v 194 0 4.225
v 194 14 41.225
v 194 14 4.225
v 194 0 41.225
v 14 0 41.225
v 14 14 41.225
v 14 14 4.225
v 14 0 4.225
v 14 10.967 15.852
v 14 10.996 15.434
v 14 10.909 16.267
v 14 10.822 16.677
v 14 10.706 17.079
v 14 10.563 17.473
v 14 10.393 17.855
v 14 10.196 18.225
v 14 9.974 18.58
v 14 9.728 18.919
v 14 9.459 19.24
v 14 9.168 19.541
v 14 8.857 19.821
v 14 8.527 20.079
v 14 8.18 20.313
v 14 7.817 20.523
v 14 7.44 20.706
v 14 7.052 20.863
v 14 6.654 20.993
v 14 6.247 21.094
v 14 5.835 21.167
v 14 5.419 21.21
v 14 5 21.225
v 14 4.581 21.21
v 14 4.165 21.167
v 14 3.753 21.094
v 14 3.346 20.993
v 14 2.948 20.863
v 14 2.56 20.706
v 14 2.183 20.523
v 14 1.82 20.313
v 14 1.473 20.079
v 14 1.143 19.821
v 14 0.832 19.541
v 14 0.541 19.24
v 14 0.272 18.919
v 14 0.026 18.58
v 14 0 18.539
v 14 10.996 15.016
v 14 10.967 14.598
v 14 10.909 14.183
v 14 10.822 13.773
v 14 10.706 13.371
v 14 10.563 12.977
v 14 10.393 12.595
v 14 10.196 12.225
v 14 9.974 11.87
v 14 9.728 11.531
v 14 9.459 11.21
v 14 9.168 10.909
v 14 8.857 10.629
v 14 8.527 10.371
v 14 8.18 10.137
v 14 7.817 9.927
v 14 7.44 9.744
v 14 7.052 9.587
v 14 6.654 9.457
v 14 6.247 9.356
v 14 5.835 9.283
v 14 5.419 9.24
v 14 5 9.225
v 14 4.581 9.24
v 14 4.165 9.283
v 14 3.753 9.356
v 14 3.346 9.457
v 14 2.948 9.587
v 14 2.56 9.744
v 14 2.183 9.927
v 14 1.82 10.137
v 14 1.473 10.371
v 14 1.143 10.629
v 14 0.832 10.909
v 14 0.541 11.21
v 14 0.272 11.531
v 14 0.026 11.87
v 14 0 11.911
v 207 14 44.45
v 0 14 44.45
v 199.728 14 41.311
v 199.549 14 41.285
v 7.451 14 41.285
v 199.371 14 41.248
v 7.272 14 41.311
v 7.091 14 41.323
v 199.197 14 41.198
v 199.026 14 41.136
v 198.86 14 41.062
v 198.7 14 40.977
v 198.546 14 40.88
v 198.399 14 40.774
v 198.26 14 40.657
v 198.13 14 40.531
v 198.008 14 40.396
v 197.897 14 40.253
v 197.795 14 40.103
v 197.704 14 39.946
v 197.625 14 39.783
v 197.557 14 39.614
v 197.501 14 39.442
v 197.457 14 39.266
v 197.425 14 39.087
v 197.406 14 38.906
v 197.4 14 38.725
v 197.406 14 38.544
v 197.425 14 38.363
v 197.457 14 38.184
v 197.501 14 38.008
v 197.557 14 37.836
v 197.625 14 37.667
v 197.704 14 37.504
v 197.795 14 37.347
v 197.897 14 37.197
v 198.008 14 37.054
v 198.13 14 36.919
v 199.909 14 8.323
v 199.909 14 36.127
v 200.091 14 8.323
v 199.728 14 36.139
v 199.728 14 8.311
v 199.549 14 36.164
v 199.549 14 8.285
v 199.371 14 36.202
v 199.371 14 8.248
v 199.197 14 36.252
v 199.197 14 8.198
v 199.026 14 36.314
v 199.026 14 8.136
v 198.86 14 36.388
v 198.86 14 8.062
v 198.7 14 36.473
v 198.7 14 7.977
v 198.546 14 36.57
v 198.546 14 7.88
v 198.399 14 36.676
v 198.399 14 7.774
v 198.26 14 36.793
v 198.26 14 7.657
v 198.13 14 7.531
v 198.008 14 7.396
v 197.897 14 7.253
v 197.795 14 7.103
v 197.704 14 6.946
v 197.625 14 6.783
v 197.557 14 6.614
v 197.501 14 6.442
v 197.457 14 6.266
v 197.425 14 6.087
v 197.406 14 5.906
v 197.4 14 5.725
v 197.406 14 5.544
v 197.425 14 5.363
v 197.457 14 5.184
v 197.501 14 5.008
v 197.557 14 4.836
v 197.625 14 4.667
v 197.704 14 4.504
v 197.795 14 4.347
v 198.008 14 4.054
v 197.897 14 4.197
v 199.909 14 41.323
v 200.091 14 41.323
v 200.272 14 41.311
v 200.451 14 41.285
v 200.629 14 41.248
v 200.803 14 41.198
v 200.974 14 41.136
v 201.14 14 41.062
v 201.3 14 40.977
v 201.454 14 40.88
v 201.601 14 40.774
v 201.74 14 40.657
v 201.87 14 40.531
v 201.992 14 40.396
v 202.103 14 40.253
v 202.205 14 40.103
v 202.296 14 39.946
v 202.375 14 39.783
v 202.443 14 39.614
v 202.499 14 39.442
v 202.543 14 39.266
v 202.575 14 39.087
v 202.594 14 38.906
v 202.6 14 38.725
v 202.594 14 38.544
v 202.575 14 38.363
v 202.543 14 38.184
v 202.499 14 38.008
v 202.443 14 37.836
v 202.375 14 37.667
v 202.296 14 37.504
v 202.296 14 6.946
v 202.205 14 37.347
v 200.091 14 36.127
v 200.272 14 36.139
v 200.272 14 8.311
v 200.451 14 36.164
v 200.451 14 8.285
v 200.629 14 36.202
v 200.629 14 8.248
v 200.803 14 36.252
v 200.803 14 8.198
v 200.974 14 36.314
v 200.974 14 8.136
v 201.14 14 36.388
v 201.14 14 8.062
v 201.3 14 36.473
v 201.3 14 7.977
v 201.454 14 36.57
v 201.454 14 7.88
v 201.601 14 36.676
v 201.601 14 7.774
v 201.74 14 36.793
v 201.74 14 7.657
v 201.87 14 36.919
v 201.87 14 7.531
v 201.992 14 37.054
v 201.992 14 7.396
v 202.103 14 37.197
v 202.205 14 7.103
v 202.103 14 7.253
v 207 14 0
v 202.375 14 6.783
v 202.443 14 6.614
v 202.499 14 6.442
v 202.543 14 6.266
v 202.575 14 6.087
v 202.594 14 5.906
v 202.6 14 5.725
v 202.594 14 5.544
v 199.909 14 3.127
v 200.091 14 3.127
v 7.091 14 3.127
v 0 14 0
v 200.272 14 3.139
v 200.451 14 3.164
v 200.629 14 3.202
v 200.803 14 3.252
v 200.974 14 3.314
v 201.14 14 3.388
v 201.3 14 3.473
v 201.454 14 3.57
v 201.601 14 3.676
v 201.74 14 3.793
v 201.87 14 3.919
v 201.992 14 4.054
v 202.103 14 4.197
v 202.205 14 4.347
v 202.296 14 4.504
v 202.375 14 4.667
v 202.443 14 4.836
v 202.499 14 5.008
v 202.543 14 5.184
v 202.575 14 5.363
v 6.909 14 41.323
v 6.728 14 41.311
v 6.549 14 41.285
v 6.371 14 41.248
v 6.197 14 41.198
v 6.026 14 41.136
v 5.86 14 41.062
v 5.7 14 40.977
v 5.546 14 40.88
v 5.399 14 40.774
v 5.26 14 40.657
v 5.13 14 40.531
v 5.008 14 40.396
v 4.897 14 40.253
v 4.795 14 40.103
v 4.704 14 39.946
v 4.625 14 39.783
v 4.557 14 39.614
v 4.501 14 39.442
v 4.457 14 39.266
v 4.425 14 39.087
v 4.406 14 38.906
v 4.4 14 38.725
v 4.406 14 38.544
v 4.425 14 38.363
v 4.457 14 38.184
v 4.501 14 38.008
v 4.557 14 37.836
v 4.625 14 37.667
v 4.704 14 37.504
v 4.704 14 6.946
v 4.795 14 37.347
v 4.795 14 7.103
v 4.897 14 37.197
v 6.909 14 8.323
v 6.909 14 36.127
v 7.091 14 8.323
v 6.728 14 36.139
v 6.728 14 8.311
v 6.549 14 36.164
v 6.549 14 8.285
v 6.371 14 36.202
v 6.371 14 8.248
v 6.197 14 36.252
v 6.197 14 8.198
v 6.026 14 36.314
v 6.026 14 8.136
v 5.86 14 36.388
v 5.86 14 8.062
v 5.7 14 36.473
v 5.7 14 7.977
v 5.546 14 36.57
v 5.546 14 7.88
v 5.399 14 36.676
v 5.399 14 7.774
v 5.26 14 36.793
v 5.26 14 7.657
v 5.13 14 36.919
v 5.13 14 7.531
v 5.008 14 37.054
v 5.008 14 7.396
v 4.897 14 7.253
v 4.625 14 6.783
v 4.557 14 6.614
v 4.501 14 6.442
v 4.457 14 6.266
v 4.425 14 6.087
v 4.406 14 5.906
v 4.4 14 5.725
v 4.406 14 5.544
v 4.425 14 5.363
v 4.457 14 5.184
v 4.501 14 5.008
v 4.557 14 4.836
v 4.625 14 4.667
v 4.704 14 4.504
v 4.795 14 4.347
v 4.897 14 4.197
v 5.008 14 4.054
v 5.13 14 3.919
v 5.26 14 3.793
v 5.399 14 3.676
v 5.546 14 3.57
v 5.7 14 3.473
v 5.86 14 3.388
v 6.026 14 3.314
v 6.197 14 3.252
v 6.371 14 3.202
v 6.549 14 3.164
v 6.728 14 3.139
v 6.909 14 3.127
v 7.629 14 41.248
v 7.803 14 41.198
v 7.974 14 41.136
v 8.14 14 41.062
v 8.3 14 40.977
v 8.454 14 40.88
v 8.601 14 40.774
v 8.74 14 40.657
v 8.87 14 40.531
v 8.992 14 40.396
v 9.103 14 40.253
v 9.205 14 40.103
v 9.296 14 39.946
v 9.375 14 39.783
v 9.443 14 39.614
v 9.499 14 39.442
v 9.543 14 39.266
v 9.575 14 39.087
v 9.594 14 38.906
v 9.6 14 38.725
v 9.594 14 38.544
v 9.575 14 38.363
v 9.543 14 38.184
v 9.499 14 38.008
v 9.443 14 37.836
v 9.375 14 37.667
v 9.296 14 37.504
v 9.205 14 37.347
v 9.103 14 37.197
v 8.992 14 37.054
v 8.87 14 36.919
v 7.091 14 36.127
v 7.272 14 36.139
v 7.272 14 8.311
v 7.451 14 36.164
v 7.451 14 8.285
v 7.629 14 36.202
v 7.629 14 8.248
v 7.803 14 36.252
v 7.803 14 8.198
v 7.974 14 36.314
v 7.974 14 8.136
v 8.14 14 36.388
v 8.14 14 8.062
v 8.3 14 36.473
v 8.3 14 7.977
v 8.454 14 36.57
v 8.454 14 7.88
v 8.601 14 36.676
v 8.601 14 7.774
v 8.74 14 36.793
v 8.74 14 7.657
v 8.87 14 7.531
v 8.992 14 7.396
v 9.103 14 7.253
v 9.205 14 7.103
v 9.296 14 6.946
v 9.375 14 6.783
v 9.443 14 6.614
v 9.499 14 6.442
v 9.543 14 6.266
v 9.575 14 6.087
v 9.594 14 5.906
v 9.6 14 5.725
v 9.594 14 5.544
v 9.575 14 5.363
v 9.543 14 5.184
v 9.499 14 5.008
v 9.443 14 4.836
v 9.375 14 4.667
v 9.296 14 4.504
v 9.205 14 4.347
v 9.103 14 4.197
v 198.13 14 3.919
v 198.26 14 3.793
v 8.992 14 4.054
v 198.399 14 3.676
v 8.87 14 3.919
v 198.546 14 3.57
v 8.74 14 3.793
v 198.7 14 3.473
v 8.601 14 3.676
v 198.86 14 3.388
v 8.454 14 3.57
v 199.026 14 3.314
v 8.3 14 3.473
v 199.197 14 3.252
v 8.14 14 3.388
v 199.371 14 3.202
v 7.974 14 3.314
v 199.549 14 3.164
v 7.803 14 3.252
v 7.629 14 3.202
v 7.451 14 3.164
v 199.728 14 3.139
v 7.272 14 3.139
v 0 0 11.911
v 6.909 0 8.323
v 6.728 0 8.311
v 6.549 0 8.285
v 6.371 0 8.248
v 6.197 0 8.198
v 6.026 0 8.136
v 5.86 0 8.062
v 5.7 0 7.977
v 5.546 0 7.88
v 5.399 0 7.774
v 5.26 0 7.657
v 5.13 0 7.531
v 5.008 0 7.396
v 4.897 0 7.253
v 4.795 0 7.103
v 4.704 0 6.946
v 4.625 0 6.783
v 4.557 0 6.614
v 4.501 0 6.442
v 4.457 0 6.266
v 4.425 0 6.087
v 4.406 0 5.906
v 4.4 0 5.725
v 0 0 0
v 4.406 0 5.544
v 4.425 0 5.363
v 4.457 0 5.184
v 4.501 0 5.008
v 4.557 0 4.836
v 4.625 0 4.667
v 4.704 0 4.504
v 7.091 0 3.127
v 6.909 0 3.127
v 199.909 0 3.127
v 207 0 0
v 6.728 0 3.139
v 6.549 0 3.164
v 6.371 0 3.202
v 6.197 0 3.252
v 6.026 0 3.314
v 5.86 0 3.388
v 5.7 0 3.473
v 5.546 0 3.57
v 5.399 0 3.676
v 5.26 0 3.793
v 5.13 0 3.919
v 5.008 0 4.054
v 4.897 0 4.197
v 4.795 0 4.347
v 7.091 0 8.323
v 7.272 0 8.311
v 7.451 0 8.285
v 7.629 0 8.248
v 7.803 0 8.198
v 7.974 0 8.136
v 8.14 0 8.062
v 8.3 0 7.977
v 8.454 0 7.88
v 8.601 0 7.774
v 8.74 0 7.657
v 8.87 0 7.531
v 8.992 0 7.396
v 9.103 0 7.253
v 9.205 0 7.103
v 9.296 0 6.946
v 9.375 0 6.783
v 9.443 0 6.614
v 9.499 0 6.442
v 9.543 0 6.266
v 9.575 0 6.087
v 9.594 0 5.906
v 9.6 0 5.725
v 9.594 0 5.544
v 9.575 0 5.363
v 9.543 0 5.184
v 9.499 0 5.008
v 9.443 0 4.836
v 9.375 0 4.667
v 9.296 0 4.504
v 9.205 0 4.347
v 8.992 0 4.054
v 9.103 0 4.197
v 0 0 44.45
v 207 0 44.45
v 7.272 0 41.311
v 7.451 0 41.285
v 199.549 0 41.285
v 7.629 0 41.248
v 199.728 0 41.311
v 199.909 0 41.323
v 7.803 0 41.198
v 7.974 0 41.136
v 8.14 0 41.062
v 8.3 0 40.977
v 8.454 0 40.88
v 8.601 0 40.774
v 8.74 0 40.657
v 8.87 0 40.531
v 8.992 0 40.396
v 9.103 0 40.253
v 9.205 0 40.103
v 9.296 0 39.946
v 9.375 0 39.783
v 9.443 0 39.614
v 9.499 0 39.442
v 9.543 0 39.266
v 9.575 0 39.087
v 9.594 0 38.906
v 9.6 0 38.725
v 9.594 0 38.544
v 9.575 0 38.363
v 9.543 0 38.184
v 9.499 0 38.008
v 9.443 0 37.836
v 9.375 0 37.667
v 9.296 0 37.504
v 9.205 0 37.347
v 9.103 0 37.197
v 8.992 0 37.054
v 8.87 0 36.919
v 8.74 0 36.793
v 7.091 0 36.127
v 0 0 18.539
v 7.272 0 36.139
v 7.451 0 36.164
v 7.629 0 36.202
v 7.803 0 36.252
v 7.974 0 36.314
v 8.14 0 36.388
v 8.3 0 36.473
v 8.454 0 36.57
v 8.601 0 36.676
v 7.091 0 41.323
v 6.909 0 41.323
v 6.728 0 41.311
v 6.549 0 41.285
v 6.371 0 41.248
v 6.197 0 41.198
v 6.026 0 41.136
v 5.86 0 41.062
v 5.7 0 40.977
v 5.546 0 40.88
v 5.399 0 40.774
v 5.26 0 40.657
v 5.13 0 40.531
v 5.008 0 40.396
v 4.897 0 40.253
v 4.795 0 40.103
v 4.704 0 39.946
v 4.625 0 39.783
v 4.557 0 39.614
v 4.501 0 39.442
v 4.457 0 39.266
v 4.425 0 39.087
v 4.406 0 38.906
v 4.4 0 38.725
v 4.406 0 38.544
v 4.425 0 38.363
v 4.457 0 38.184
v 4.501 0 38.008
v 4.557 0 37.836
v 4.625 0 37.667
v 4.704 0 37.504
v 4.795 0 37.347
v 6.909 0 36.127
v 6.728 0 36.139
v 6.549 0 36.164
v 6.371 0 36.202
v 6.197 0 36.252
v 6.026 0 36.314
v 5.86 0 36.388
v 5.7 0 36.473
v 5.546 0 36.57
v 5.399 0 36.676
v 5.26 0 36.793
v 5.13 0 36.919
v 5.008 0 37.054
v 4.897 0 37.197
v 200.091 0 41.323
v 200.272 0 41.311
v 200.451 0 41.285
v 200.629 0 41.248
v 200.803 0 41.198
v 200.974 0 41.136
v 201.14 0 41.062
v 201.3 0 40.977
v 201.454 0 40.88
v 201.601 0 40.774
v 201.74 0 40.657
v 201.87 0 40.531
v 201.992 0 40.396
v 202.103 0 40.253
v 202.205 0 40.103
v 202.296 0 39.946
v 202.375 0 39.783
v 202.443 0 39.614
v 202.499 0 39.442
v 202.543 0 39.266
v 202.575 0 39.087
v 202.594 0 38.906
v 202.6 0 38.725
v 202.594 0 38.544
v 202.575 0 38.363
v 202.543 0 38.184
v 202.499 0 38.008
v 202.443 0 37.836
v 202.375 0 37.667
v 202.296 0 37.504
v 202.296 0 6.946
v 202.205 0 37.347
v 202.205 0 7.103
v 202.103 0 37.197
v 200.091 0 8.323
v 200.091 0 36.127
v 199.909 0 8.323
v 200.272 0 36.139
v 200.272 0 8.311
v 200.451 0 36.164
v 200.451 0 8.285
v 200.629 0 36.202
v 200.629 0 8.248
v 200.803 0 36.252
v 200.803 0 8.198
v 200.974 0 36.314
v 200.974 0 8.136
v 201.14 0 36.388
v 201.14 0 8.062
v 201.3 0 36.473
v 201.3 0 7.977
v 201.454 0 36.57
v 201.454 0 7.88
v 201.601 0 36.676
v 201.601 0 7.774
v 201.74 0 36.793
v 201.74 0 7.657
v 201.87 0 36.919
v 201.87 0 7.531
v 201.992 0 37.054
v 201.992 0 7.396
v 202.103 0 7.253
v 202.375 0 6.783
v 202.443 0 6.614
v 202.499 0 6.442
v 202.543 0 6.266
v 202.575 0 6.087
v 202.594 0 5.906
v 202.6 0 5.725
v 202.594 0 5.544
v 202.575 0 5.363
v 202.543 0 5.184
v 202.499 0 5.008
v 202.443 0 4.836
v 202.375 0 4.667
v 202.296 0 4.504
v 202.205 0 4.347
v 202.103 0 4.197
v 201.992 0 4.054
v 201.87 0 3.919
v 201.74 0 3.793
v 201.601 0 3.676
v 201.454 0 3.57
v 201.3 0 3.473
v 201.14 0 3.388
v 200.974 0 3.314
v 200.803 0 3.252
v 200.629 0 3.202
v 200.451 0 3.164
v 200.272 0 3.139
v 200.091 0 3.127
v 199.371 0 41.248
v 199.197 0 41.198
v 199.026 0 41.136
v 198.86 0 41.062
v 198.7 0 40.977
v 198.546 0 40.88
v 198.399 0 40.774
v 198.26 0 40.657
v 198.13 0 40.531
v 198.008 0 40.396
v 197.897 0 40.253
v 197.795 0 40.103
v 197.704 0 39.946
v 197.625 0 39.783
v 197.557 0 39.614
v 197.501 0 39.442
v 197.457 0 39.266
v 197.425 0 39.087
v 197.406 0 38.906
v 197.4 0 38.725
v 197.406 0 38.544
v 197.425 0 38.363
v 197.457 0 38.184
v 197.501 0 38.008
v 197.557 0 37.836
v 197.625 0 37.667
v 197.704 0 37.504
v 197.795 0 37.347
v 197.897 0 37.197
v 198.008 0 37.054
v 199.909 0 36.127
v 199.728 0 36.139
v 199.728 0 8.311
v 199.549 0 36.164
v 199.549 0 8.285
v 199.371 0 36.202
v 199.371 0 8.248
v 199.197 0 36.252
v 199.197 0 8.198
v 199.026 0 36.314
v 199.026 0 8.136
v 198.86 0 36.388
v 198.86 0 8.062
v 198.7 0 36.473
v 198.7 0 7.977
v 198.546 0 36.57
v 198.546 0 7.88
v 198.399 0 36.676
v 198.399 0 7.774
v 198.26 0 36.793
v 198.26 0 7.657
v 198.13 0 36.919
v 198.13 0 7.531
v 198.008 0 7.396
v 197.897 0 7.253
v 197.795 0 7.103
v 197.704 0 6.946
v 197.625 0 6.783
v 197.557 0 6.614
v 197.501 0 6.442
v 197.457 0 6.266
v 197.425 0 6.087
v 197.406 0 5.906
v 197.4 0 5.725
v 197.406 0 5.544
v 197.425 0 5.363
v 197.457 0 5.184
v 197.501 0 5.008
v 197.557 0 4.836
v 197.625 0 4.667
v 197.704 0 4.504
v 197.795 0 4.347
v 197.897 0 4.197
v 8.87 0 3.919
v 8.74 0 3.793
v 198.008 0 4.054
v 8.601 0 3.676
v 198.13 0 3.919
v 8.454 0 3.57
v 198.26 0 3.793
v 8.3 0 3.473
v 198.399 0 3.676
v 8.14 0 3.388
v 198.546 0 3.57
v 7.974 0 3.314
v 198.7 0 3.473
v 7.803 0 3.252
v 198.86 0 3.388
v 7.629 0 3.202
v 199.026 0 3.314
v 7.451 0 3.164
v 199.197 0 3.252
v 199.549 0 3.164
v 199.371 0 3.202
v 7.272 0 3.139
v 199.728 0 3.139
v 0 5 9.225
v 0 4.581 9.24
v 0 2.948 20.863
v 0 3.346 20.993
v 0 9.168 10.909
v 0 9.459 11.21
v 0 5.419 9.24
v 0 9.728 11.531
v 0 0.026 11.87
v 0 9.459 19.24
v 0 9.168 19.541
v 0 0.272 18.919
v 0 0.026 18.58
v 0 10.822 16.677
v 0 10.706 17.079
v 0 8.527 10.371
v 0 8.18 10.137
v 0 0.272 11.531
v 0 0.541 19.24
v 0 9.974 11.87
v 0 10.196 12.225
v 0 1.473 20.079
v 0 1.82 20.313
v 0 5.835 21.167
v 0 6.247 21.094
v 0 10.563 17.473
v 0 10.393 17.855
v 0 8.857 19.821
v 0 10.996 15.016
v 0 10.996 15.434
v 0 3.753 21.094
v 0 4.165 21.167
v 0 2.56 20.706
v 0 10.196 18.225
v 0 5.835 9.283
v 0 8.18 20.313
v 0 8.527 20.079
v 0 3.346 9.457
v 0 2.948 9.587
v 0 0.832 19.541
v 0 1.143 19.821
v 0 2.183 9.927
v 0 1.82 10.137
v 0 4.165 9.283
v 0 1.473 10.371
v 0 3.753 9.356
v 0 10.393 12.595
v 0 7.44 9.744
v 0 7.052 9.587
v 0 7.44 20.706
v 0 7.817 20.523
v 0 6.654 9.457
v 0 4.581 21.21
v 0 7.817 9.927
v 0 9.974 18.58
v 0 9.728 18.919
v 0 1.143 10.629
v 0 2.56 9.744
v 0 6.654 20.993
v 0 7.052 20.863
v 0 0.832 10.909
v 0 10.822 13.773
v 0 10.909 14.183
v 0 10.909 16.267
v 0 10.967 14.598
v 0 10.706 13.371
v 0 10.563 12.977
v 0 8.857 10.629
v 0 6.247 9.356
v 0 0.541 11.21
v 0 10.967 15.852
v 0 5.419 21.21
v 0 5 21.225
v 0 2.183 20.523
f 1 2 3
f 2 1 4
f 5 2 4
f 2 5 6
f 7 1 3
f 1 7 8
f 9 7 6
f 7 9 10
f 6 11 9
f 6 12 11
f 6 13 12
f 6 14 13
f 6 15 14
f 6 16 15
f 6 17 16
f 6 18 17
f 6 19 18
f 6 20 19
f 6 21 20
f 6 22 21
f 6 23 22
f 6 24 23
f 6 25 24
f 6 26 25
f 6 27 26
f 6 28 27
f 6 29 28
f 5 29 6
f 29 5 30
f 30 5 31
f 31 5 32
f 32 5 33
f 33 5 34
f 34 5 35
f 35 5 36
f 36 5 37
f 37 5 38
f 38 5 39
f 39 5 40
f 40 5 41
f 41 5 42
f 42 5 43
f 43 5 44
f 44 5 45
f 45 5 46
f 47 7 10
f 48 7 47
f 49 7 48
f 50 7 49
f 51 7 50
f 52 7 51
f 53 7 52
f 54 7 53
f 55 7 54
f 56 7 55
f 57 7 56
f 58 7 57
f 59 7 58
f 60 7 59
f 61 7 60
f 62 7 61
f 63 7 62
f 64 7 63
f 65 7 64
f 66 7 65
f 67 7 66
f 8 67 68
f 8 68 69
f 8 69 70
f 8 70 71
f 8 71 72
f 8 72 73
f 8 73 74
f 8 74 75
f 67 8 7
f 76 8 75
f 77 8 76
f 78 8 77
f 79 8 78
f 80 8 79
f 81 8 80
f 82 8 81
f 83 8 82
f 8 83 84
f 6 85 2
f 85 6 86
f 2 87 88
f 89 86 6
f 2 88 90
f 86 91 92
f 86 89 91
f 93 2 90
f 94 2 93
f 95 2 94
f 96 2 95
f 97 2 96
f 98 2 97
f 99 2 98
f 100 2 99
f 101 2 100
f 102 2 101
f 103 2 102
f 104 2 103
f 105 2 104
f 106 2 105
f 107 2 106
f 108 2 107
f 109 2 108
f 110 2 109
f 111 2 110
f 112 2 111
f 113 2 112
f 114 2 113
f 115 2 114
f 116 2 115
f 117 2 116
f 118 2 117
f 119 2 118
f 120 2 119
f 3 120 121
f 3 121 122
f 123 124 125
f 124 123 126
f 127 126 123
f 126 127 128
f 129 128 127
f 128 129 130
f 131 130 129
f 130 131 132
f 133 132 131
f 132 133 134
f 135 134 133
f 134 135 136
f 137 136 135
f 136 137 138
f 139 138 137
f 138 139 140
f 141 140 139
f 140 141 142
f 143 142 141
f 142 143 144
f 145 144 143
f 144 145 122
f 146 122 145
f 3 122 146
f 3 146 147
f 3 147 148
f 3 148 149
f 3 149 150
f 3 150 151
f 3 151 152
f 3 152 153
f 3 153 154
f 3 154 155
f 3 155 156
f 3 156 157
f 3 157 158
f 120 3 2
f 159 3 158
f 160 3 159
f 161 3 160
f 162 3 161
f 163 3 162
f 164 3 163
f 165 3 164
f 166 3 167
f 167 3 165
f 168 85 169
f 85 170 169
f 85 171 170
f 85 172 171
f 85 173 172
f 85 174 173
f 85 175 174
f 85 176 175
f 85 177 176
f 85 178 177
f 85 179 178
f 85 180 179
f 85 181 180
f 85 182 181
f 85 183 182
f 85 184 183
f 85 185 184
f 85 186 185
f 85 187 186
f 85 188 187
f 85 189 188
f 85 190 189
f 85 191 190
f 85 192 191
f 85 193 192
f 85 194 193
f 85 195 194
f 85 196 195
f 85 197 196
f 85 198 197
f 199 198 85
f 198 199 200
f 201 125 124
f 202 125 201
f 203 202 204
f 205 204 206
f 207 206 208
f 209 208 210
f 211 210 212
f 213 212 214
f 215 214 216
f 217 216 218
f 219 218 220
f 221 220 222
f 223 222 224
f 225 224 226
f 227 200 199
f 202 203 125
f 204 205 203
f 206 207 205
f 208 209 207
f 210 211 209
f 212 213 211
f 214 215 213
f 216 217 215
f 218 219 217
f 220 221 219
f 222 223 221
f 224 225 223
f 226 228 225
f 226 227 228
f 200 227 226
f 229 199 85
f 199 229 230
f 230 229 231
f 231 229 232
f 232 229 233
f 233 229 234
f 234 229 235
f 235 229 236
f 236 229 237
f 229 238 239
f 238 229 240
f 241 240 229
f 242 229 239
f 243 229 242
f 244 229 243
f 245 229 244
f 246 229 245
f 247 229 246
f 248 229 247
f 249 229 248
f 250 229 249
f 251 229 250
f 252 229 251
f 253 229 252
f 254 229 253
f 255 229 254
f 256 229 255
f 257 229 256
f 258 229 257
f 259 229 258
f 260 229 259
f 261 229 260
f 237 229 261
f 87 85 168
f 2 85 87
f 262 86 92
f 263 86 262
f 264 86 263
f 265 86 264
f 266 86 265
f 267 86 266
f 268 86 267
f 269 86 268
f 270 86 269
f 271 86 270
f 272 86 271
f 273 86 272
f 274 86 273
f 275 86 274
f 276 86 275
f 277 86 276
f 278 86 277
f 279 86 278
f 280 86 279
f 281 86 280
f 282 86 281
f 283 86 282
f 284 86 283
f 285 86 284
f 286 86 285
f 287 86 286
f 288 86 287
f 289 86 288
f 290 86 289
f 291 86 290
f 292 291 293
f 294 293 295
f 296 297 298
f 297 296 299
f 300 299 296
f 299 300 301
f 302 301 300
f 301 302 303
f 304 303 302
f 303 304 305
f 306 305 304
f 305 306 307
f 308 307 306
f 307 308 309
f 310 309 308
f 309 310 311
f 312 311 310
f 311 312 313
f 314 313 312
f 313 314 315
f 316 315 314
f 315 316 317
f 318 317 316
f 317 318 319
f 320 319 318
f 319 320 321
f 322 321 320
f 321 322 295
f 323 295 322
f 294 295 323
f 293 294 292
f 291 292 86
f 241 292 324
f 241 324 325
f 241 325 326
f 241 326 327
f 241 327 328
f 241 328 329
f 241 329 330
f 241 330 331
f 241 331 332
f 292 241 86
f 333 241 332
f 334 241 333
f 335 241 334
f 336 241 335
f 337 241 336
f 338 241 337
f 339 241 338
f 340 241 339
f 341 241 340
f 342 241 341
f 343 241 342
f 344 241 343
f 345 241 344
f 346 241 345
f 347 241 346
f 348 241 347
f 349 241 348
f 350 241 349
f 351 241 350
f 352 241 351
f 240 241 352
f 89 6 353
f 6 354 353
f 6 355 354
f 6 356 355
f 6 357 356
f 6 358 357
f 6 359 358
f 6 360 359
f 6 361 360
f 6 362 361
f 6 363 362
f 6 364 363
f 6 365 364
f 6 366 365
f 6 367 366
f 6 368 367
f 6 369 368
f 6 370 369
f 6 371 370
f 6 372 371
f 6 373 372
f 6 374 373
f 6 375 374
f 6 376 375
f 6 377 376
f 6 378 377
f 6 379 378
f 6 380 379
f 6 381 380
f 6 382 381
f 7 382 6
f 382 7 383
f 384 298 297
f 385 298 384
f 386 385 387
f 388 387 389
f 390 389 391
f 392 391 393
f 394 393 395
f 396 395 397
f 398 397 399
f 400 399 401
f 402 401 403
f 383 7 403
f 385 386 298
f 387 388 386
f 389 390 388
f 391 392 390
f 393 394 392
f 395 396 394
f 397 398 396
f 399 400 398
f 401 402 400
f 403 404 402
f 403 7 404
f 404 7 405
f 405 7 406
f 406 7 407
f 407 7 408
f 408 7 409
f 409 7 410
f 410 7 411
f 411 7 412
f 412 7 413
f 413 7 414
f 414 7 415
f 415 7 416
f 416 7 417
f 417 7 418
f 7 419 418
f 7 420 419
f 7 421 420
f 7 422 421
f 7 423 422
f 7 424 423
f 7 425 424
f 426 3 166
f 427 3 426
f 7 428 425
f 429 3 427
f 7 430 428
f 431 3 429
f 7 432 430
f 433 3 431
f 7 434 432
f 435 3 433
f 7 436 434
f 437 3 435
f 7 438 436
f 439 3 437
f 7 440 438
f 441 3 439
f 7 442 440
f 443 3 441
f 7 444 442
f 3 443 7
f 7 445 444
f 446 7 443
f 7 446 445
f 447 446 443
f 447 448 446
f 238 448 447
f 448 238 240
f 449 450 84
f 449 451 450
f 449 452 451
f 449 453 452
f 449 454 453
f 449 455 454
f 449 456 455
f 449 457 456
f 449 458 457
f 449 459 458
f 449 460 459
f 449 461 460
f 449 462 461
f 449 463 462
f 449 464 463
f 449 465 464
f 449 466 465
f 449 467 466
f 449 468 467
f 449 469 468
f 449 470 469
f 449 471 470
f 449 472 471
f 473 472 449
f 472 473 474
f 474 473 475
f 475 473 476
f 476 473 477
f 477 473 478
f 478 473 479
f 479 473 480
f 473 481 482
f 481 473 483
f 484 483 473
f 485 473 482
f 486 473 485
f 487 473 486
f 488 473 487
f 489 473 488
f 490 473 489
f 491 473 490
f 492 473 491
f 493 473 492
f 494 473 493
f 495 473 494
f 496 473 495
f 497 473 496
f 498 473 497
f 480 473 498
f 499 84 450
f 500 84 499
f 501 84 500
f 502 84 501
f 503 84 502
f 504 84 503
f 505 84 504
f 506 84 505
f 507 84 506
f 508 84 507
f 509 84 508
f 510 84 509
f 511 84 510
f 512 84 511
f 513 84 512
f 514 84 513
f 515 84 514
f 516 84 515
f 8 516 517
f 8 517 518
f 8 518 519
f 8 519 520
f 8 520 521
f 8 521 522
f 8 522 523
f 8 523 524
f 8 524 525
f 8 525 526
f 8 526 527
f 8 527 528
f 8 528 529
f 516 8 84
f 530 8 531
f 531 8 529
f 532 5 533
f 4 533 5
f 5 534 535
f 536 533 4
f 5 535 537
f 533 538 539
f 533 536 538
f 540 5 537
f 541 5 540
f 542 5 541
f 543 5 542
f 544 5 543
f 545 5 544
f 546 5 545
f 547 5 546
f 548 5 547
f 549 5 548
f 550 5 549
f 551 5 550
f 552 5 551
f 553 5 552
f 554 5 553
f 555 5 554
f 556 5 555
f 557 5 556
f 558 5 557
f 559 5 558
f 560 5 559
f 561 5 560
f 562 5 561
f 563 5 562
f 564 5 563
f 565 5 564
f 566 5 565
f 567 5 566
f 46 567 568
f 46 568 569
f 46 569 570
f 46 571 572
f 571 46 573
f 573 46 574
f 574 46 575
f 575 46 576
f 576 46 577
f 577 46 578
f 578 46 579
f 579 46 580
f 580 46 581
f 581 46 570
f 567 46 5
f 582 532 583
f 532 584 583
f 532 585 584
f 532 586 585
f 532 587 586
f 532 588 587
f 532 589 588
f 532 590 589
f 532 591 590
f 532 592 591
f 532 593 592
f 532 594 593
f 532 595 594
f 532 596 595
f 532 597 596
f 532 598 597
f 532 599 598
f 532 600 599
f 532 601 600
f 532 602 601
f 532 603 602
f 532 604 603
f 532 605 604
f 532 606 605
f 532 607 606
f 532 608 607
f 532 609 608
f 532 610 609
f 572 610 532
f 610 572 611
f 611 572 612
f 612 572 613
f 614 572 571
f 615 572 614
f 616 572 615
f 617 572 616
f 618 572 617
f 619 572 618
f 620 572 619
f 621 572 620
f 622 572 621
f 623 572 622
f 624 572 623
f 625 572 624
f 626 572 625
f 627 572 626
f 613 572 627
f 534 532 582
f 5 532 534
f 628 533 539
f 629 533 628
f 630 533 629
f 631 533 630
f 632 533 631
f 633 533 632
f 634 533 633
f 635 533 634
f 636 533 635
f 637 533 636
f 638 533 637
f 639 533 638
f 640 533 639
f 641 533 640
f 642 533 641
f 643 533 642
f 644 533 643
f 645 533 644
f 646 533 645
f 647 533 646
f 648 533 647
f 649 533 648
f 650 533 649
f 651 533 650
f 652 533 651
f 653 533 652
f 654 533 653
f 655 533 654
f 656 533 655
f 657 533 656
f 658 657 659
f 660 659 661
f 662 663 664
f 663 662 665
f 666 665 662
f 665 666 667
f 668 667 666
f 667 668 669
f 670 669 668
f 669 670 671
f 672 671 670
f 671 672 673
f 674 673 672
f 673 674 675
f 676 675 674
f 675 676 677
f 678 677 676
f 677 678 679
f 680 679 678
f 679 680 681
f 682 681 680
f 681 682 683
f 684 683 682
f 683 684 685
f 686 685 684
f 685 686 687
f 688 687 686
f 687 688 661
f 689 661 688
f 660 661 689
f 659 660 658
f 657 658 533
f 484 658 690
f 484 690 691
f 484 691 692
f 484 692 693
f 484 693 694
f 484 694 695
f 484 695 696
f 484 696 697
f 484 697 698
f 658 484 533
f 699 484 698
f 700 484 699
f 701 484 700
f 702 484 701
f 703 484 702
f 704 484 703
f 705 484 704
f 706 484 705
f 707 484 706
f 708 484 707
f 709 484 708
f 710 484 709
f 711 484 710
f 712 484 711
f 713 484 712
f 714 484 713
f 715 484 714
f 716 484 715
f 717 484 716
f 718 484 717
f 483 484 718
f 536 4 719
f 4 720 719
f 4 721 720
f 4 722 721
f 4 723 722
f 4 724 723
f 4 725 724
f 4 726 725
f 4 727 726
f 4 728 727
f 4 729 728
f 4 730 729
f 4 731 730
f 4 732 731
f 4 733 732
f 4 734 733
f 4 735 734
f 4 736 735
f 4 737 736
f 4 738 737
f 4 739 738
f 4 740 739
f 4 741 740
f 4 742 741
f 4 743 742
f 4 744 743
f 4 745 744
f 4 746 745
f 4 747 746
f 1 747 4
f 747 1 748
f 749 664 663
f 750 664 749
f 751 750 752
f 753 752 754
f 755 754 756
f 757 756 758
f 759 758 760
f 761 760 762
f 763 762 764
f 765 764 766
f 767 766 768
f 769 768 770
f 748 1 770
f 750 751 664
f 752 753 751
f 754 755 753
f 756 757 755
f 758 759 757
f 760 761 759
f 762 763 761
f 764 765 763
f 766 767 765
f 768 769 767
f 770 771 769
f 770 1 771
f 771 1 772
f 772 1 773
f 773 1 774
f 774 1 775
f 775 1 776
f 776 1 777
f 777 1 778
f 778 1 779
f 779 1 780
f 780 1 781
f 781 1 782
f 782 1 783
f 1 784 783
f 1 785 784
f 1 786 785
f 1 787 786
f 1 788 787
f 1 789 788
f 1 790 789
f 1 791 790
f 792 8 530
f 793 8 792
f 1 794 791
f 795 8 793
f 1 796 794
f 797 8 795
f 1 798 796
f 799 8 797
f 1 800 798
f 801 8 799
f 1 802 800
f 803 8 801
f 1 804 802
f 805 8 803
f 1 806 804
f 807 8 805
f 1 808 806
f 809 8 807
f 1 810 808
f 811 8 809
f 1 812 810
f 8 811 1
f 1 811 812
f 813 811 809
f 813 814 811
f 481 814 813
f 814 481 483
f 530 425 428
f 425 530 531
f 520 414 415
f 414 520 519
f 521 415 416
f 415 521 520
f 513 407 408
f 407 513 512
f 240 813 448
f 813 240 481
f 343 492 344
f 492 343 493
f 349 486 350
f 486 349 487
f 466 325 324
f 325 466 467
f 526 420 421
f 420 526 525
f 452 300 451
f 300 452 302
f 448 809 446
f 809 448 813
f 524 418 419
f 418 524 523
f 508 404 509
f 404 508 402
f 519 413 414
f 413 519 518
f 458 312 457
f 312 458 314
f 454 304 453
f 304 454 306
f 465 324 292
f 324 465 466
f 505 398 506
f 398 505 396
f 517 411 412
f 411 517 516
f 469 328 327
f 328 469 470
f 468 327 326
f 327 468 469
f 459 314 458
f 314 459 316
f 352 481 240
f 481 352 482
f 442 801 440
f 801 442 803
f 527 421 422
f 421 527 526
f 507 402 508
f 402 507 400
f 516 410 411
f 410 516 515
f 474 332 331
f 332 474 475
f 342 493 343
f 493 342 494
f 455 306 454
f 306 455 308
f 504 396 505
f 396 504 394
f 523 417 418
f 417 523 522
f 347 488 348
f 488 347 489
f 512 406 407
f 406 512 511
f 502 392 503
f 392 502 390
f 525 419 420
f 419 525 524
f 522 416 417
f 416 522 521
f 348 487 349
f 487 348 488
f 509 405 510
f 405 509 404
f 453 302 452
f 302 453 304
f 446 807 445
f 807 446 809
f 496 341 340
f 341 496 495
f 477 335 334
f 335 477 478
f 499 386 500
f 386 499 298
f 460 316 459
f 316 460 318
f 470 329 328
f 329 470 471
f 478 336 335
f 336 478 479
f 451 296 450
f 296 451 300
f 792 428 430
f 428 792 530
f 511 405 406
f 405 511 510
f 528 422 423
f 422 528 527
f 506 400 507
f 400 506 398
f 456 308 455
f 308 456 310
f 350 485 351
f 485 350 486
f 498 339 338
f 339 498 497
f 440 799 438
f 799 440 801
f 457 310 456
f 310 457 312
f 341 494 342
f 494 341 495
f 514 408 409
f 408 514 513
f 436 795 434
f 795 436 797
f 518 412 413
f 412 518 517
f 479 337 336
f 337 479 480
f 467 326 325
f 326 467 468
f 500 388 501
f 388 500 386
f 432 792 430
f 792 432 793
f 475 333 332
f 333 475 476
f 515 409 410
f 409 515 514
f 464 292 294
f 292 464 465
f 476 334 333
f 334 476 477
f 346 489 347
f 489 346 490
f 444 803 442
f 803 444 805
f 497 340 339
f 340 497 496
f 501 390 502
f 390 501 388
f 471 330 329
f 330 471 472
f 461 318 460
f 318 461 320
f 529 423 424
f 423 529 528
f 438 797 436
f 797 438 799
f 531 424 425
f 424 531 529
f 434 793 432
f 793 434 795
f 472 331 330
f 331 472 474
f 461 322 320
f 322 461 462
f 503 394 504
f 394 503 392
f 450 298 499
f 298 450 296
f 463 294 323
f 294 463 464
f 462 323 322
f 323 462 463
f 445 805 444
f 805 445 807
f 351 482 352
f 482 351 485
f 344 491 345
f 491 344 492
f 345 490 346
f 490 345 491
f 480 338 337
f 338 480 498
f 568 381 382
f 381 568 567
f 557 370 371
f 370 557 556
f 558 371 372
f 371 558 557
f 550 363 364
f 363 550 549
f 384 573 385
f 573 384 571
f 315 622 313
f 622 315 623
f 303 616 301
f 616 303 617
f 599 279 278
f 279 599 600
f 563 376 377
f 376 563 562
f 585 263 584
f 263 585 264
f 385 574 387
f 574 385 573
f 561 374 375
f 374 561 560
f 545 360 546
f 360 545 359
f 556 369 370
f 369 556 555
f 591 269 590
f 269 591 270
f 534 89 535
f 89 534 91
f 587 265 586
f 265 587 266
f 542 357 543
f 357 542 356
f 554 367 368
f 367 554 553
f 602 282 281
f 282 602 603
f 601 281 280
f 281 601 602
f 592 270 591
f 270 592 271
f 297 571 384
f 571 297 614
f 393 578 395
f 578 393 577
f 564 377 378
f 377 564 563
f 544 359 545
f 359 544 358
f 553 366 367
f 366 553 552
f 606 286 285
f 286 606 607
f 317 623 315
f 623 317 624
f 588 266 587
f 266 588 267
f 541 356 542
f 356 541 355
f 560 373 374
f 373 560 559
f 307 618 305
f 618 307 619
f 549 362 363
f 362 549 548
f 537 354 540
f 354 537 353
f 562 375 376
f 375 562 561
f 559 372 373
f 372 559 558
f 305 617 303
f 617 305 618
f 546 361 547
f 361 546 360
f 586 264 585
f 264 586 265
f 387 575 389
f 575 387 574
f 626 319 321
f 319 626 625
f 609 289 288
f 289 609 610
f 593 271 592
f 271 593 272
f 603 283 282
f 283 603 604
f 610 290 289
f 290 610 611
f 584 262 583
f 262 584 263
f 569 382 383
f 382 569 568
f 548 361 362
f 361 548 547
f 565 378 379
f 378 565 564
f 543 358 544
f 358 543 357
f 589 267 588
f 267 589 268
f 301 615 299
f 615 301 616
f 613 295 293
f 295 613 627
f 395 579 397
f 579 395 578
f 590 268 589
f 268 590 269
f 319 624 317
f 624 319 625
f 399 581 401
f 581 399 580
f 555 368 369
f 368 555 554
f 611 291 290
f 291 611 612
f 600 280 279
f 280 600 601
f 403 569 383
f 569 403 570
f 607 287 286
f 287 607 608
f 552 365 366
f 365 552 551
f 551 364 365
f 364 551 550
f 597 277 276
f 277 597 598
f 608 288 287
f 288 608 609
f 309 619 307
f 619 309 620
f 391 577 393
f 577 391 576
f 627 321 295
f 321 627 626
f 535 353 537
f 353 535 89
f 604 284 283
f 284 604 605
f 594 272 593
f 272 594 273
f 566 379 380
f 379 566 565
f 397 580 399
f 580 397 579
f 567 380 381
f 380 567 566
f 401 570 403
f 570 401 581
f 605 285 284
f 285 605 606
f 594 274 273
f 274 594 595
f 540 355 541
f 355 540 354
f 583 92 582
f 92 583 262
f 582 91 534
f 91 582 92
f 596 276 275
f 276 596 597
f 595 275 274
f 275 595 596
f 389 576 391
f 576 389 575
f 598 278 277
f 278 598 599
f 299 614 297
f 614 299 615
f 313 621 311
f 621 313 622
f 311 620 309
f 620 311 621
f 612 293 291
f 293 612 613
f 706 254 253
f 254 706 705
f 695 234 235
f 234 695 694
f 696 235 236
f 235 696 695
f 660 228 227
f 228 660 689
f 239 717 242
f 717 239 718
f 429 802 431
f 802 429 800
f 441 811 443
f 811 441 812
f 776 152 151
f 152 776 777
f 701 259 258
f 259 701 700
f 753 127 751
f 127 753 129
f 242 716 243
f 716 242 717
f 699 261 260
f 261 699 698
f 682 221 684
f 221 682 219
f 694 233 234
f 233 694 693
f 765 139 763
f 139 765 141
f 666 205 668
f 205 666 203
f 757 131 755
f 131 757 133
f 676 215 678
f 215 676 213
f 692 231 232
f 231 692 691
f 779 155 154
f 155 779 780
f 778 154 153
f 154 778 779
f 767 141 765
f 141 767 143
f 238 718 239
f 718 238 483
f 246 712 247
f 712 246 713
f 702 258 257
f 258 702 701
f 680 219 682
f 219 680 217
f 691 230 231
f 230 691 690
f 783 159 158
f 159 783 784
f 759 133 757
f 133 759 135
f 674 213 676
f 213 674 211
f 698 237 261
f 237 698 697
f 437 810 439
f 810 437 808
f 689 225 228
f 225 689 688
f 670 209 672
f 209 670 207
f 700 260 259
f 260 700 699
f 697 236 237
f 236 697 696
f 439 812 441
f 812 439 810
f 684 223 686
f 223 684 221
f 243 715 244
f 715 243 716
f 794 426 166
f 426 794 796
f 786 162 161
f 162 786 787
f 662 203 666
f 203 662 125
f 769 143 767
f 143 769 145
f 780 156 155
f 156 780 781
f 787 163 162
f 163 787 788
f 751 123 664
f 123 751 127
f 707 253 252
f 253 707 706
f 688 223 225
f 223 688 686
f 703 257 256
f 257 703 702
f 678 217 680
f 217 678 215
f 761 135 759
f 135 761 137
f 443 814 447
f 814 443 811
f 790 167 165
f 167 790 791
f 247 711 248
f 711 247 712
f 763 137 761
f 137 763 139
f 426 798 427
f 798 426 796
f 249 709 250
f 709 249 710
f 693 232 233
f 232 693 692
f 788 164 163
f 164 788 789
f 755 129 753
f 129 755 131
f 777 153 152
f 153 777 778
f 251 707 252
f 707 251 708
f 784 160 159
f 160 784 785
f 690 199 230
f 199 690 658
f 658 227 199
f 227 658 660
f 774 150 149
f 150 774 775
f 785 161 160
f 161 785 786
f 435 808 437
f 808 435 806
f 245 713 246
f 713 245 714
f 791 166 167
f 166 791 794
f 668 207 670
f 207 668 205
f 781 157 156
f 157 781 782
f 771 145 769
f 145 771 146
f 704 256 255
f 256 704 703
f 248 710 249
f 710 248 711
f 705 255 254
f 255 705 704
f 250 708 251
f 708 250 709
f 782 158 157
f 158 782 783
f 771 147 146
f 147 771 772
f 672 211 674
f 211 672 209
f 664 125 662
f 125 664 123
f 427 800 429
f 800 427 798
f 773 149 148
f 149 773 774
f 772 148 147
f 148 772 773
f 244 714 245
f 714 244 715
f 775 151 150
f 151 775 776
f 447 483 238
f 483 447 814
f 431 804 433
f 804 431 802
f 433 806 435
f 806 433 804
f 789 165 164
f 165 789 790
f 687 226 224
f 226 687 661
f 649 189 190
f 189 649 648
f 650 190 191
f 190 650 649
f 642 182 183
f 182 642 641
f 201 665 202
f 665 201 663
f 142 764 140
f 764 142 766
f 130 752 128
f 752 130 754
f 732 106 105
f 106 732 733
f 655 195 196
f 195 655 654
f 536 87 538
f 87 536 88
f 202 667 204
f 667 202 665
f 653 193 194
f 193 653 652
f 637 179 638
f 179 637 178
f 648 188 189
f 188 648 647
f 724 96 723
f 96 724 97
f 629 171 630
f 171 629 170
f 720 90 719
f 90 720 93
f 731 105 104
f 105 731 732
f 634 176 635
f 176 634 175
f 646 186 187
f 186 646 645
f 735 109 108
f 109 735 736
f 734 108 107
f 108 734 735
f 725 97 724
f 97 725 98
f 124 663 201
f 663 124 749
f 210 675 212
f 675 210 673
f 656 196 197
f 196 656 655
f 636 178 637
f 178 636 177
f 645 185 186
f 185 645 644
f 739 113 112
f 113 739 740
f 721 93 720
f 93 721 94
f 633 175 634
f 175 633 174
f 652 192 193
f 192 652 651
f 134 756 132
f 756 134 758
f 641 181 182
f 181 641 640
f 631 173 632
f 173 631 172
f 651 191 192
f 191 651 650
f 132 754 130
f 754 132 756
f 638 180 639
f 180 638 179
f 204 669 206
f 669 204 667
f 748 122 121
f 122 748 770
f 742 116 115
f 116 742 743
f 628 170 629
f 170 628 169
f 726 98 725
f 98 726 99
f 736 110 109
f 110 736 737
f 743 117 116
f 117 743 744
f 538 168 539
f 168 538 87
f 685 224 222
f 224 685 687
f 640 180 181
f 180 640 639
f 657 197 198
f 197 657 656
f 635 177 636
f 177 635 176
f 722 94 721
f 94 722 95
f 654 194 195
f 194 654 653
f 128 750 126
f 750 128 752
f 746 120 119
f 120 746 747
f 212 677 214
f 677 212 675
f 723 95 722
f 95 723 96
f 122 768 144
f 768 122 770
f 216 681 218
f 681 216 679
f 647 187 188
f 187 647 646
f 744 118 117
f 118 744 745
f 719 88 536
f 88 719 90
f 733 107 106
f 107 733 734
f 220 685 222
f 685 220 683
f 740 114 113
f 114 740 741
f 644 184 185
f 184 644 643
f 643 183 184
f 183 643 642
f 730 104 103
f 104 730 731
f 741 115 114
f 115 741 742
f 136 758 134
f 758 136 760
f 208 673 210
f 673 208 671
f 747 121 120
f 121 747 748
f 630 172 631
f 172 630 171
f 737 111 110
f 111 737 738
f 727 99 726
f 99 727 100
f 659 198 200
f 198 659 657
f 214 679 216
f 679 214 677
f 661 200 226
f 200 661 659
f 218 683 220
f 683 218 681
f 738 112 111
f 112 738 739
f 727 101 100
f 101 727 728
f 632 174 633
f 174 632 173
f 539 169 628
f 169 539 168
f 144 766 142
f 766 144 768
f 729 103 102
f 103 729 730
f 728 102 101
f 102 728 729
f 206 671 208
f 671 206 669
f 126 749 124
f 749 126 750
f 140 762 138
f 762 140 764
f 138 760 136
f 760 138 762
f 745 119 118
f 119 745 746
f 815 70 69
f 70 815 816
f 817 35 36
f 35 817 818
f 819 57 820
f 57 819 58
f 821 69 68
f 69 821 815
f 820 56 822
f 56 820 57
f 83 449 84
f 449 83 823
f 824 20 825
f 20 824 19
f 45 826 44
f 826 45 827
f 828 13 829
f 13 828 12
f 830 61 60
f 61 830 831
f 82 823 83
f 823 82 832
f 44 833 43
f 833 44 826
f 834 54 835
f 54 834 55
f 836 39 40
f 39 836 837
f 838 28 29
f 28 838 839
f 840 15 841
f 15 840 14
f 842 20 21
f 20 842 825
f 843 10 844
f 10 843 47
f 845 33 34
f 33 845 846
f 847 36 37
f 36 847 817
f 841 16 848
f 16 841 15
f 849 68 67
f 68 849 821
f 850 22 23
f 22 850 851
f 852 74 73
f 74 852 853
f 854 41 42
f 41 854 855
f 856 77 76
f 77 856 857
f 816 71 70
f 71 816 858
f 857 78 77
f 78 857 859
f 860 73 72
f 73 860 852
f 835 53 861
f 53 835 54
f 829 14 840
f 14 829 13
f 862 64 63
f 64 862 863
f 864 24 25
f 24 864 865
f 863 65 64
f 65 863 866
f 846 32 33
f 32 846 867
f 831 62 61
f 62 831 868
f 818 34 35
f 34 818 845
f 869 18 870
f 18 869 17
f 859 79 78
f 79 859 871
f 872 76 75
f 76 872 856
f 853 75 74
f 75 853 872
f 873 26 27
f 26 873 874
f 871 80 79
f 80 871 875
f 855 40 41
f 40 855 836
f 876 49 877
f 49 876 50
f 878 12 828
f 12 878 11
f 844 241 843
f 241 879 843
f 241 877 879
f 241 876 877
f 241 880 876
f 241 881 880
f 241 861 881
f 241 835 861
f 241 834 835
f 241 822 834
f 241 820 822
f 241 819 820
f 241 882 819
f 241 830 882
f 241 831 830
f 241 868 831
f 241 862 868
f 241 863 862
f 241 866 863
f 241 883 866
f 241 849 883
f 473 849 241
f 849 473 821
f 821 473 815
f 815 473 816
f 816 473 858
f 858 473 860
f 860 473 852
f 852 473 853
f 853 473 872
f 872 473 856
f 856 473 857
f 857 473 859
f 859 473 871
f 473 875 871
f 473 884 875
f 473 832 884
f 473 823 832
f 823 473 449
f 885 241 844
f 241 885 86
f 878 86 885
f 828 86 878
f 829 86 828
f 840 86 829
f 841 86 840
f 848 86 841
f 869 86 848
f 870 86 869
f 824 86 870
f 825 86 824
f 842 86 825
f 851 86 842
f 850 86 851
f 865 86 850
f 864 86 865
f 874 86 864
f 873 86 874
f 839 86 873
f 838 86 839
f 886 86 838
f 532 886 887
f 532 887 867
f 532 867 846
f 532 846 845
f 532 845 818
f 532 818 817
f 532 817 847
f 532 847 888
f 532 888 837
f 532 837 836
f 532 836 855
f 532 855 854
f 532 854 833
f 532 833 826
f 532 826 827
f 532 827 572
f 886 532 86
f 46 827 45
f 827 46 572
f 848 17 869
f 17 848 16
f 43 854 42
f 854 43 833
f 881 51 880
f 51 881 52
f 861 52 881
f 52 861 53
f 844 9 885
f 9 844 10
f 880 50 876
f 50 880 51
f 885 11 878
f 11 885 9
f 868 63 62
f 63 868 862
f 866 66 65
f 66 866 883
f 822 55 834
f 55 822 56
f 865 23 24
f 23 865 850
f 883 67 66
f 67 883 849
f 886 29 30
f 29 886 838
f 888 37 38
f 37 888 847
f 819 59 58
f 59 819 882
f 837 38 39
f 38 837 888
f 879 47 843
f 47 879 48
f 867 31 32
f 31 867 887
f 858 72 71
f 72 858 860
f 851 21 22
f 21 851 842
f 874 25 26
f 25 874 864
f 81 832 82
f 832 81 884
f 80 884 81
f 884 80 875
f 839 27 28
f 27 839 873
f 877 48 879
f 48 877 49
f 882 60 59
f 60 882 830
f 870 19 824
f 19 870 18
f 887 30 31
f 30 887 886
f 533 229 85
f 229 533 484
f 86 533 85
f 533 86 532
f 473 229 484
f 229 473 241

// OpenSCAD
// file: ../../utils/constants.scad
$fn=90;  // accuracy

/* Server dimentions */

// one server unit
u1 = 44.45;  

// two server unit
u2 = u1*2;   

// total width
// The total with of the a server rack (19")
// this includes the mounting holes
tw  = 482.6; 

// Total inner width
// The distance between the mounting holes in the server rack
tiw = 450; // TODO: 432?  


/* Rack hole dimentions */

// width distance rack holes
wdrh = 465;

// height distance rack holes
hdrh = 33;


/* dell optiplex 7040 micro usff dimentions */

// dell optiplex 7040 height
do7040h = 36;

// dell optiplex 7040 width
do7040w = 182;

// dell optiplex 7040 depth
do7040d = 179;

// dell optiplex 7040 rubber feet width distance
do7040rfwd = 14.9;

// dell optiplex 7040 rubber feet back depth distance
do7040rfbdd = 9.9;


/* Case dimentions */

// case height outer 
// A small margin is included to so that the case does not 
// exide two server units
cho = u2-0.2; 

// case height inner
// The thickness of the walls can then be calculated as (cho-chi)/2
chi = cho-7*2;

// case width outer
// as there are three parts of the rack server case we just devide
// the total inner width with three 
cwo = tiw/3;

// case width inner
// 132 was calculated by defining by the desired with between each node, 
// i.e., 22. The first and last hole is 22/2 mm away from the side of the case.
// This gives us 22*5+(22/2)*2 = 22*6 = 132
cwi = 132;

// case depth thickness
// How thick the case should be. It should not be that important.
// Just know that it is enough for a screw to thread in the case 
cdt = 14;

// case inner side thickness
// The middle and the side case over lap so that a screw can be entered
// between the two cases. The cist is defined as the thickness of the part
// that does not overlap between the midle and side case.
cist = 3.5;

// nodes per case
npc = 6;
// main file
include <../../utils/constants.scad>;

/* caseSideMount
    height: should be the same as usff-pc height
    ct: case thickness
    power_switch: ture/false
*/
module usffSide(ew, height, ct, power_switch) {
  m = 1; // margin
  hd = 5.2; // hole diameter
  pscpfb = 11; // power switch center position from bottom
  psd = 12; // power switch diameter
  tbt = (height-do7040h)/2;// Top/bottom thickness
  hph1 = (height-hdrh)/2; // Hole height width 1
  hph2 = hph1+hdrh; // Hole height width 2
  hpw = 7; // Hole posistion width

  difference() {
    cube([do7040d+ct*2,ct,height]);

    union() {
      translate([ct,0,tbt])
      cube([do7040d+m,ct,do7040h+m]);

      translate([hpw,ct,hph1])
      rotate([90,0,0])
      #cylinder(d=hd, h=ct);

      translate([hpw,ct,hph2])
      rotate([90,0,0])
      #cylinder(d=hd, h=ct);

      translate([(do7040d+ct*2)-hpw,ct,hph1])
      rotate([90,0,0])
      #cylinder(d=hd, h=ct);

      translate([(do7040d+ct*2)-hpw,ct,hph2])
      rotate([90,0,0])
      #cylinder(d=hd, h=ct);

      if (power_switch) {
        translate([0,ct-9,pscpfb+tbt])
        rotate([0,90,0])
        #cylinder(d=psd, h=ct);
      }
    }
  }
}

usffSide(20, u1, 14, true);
